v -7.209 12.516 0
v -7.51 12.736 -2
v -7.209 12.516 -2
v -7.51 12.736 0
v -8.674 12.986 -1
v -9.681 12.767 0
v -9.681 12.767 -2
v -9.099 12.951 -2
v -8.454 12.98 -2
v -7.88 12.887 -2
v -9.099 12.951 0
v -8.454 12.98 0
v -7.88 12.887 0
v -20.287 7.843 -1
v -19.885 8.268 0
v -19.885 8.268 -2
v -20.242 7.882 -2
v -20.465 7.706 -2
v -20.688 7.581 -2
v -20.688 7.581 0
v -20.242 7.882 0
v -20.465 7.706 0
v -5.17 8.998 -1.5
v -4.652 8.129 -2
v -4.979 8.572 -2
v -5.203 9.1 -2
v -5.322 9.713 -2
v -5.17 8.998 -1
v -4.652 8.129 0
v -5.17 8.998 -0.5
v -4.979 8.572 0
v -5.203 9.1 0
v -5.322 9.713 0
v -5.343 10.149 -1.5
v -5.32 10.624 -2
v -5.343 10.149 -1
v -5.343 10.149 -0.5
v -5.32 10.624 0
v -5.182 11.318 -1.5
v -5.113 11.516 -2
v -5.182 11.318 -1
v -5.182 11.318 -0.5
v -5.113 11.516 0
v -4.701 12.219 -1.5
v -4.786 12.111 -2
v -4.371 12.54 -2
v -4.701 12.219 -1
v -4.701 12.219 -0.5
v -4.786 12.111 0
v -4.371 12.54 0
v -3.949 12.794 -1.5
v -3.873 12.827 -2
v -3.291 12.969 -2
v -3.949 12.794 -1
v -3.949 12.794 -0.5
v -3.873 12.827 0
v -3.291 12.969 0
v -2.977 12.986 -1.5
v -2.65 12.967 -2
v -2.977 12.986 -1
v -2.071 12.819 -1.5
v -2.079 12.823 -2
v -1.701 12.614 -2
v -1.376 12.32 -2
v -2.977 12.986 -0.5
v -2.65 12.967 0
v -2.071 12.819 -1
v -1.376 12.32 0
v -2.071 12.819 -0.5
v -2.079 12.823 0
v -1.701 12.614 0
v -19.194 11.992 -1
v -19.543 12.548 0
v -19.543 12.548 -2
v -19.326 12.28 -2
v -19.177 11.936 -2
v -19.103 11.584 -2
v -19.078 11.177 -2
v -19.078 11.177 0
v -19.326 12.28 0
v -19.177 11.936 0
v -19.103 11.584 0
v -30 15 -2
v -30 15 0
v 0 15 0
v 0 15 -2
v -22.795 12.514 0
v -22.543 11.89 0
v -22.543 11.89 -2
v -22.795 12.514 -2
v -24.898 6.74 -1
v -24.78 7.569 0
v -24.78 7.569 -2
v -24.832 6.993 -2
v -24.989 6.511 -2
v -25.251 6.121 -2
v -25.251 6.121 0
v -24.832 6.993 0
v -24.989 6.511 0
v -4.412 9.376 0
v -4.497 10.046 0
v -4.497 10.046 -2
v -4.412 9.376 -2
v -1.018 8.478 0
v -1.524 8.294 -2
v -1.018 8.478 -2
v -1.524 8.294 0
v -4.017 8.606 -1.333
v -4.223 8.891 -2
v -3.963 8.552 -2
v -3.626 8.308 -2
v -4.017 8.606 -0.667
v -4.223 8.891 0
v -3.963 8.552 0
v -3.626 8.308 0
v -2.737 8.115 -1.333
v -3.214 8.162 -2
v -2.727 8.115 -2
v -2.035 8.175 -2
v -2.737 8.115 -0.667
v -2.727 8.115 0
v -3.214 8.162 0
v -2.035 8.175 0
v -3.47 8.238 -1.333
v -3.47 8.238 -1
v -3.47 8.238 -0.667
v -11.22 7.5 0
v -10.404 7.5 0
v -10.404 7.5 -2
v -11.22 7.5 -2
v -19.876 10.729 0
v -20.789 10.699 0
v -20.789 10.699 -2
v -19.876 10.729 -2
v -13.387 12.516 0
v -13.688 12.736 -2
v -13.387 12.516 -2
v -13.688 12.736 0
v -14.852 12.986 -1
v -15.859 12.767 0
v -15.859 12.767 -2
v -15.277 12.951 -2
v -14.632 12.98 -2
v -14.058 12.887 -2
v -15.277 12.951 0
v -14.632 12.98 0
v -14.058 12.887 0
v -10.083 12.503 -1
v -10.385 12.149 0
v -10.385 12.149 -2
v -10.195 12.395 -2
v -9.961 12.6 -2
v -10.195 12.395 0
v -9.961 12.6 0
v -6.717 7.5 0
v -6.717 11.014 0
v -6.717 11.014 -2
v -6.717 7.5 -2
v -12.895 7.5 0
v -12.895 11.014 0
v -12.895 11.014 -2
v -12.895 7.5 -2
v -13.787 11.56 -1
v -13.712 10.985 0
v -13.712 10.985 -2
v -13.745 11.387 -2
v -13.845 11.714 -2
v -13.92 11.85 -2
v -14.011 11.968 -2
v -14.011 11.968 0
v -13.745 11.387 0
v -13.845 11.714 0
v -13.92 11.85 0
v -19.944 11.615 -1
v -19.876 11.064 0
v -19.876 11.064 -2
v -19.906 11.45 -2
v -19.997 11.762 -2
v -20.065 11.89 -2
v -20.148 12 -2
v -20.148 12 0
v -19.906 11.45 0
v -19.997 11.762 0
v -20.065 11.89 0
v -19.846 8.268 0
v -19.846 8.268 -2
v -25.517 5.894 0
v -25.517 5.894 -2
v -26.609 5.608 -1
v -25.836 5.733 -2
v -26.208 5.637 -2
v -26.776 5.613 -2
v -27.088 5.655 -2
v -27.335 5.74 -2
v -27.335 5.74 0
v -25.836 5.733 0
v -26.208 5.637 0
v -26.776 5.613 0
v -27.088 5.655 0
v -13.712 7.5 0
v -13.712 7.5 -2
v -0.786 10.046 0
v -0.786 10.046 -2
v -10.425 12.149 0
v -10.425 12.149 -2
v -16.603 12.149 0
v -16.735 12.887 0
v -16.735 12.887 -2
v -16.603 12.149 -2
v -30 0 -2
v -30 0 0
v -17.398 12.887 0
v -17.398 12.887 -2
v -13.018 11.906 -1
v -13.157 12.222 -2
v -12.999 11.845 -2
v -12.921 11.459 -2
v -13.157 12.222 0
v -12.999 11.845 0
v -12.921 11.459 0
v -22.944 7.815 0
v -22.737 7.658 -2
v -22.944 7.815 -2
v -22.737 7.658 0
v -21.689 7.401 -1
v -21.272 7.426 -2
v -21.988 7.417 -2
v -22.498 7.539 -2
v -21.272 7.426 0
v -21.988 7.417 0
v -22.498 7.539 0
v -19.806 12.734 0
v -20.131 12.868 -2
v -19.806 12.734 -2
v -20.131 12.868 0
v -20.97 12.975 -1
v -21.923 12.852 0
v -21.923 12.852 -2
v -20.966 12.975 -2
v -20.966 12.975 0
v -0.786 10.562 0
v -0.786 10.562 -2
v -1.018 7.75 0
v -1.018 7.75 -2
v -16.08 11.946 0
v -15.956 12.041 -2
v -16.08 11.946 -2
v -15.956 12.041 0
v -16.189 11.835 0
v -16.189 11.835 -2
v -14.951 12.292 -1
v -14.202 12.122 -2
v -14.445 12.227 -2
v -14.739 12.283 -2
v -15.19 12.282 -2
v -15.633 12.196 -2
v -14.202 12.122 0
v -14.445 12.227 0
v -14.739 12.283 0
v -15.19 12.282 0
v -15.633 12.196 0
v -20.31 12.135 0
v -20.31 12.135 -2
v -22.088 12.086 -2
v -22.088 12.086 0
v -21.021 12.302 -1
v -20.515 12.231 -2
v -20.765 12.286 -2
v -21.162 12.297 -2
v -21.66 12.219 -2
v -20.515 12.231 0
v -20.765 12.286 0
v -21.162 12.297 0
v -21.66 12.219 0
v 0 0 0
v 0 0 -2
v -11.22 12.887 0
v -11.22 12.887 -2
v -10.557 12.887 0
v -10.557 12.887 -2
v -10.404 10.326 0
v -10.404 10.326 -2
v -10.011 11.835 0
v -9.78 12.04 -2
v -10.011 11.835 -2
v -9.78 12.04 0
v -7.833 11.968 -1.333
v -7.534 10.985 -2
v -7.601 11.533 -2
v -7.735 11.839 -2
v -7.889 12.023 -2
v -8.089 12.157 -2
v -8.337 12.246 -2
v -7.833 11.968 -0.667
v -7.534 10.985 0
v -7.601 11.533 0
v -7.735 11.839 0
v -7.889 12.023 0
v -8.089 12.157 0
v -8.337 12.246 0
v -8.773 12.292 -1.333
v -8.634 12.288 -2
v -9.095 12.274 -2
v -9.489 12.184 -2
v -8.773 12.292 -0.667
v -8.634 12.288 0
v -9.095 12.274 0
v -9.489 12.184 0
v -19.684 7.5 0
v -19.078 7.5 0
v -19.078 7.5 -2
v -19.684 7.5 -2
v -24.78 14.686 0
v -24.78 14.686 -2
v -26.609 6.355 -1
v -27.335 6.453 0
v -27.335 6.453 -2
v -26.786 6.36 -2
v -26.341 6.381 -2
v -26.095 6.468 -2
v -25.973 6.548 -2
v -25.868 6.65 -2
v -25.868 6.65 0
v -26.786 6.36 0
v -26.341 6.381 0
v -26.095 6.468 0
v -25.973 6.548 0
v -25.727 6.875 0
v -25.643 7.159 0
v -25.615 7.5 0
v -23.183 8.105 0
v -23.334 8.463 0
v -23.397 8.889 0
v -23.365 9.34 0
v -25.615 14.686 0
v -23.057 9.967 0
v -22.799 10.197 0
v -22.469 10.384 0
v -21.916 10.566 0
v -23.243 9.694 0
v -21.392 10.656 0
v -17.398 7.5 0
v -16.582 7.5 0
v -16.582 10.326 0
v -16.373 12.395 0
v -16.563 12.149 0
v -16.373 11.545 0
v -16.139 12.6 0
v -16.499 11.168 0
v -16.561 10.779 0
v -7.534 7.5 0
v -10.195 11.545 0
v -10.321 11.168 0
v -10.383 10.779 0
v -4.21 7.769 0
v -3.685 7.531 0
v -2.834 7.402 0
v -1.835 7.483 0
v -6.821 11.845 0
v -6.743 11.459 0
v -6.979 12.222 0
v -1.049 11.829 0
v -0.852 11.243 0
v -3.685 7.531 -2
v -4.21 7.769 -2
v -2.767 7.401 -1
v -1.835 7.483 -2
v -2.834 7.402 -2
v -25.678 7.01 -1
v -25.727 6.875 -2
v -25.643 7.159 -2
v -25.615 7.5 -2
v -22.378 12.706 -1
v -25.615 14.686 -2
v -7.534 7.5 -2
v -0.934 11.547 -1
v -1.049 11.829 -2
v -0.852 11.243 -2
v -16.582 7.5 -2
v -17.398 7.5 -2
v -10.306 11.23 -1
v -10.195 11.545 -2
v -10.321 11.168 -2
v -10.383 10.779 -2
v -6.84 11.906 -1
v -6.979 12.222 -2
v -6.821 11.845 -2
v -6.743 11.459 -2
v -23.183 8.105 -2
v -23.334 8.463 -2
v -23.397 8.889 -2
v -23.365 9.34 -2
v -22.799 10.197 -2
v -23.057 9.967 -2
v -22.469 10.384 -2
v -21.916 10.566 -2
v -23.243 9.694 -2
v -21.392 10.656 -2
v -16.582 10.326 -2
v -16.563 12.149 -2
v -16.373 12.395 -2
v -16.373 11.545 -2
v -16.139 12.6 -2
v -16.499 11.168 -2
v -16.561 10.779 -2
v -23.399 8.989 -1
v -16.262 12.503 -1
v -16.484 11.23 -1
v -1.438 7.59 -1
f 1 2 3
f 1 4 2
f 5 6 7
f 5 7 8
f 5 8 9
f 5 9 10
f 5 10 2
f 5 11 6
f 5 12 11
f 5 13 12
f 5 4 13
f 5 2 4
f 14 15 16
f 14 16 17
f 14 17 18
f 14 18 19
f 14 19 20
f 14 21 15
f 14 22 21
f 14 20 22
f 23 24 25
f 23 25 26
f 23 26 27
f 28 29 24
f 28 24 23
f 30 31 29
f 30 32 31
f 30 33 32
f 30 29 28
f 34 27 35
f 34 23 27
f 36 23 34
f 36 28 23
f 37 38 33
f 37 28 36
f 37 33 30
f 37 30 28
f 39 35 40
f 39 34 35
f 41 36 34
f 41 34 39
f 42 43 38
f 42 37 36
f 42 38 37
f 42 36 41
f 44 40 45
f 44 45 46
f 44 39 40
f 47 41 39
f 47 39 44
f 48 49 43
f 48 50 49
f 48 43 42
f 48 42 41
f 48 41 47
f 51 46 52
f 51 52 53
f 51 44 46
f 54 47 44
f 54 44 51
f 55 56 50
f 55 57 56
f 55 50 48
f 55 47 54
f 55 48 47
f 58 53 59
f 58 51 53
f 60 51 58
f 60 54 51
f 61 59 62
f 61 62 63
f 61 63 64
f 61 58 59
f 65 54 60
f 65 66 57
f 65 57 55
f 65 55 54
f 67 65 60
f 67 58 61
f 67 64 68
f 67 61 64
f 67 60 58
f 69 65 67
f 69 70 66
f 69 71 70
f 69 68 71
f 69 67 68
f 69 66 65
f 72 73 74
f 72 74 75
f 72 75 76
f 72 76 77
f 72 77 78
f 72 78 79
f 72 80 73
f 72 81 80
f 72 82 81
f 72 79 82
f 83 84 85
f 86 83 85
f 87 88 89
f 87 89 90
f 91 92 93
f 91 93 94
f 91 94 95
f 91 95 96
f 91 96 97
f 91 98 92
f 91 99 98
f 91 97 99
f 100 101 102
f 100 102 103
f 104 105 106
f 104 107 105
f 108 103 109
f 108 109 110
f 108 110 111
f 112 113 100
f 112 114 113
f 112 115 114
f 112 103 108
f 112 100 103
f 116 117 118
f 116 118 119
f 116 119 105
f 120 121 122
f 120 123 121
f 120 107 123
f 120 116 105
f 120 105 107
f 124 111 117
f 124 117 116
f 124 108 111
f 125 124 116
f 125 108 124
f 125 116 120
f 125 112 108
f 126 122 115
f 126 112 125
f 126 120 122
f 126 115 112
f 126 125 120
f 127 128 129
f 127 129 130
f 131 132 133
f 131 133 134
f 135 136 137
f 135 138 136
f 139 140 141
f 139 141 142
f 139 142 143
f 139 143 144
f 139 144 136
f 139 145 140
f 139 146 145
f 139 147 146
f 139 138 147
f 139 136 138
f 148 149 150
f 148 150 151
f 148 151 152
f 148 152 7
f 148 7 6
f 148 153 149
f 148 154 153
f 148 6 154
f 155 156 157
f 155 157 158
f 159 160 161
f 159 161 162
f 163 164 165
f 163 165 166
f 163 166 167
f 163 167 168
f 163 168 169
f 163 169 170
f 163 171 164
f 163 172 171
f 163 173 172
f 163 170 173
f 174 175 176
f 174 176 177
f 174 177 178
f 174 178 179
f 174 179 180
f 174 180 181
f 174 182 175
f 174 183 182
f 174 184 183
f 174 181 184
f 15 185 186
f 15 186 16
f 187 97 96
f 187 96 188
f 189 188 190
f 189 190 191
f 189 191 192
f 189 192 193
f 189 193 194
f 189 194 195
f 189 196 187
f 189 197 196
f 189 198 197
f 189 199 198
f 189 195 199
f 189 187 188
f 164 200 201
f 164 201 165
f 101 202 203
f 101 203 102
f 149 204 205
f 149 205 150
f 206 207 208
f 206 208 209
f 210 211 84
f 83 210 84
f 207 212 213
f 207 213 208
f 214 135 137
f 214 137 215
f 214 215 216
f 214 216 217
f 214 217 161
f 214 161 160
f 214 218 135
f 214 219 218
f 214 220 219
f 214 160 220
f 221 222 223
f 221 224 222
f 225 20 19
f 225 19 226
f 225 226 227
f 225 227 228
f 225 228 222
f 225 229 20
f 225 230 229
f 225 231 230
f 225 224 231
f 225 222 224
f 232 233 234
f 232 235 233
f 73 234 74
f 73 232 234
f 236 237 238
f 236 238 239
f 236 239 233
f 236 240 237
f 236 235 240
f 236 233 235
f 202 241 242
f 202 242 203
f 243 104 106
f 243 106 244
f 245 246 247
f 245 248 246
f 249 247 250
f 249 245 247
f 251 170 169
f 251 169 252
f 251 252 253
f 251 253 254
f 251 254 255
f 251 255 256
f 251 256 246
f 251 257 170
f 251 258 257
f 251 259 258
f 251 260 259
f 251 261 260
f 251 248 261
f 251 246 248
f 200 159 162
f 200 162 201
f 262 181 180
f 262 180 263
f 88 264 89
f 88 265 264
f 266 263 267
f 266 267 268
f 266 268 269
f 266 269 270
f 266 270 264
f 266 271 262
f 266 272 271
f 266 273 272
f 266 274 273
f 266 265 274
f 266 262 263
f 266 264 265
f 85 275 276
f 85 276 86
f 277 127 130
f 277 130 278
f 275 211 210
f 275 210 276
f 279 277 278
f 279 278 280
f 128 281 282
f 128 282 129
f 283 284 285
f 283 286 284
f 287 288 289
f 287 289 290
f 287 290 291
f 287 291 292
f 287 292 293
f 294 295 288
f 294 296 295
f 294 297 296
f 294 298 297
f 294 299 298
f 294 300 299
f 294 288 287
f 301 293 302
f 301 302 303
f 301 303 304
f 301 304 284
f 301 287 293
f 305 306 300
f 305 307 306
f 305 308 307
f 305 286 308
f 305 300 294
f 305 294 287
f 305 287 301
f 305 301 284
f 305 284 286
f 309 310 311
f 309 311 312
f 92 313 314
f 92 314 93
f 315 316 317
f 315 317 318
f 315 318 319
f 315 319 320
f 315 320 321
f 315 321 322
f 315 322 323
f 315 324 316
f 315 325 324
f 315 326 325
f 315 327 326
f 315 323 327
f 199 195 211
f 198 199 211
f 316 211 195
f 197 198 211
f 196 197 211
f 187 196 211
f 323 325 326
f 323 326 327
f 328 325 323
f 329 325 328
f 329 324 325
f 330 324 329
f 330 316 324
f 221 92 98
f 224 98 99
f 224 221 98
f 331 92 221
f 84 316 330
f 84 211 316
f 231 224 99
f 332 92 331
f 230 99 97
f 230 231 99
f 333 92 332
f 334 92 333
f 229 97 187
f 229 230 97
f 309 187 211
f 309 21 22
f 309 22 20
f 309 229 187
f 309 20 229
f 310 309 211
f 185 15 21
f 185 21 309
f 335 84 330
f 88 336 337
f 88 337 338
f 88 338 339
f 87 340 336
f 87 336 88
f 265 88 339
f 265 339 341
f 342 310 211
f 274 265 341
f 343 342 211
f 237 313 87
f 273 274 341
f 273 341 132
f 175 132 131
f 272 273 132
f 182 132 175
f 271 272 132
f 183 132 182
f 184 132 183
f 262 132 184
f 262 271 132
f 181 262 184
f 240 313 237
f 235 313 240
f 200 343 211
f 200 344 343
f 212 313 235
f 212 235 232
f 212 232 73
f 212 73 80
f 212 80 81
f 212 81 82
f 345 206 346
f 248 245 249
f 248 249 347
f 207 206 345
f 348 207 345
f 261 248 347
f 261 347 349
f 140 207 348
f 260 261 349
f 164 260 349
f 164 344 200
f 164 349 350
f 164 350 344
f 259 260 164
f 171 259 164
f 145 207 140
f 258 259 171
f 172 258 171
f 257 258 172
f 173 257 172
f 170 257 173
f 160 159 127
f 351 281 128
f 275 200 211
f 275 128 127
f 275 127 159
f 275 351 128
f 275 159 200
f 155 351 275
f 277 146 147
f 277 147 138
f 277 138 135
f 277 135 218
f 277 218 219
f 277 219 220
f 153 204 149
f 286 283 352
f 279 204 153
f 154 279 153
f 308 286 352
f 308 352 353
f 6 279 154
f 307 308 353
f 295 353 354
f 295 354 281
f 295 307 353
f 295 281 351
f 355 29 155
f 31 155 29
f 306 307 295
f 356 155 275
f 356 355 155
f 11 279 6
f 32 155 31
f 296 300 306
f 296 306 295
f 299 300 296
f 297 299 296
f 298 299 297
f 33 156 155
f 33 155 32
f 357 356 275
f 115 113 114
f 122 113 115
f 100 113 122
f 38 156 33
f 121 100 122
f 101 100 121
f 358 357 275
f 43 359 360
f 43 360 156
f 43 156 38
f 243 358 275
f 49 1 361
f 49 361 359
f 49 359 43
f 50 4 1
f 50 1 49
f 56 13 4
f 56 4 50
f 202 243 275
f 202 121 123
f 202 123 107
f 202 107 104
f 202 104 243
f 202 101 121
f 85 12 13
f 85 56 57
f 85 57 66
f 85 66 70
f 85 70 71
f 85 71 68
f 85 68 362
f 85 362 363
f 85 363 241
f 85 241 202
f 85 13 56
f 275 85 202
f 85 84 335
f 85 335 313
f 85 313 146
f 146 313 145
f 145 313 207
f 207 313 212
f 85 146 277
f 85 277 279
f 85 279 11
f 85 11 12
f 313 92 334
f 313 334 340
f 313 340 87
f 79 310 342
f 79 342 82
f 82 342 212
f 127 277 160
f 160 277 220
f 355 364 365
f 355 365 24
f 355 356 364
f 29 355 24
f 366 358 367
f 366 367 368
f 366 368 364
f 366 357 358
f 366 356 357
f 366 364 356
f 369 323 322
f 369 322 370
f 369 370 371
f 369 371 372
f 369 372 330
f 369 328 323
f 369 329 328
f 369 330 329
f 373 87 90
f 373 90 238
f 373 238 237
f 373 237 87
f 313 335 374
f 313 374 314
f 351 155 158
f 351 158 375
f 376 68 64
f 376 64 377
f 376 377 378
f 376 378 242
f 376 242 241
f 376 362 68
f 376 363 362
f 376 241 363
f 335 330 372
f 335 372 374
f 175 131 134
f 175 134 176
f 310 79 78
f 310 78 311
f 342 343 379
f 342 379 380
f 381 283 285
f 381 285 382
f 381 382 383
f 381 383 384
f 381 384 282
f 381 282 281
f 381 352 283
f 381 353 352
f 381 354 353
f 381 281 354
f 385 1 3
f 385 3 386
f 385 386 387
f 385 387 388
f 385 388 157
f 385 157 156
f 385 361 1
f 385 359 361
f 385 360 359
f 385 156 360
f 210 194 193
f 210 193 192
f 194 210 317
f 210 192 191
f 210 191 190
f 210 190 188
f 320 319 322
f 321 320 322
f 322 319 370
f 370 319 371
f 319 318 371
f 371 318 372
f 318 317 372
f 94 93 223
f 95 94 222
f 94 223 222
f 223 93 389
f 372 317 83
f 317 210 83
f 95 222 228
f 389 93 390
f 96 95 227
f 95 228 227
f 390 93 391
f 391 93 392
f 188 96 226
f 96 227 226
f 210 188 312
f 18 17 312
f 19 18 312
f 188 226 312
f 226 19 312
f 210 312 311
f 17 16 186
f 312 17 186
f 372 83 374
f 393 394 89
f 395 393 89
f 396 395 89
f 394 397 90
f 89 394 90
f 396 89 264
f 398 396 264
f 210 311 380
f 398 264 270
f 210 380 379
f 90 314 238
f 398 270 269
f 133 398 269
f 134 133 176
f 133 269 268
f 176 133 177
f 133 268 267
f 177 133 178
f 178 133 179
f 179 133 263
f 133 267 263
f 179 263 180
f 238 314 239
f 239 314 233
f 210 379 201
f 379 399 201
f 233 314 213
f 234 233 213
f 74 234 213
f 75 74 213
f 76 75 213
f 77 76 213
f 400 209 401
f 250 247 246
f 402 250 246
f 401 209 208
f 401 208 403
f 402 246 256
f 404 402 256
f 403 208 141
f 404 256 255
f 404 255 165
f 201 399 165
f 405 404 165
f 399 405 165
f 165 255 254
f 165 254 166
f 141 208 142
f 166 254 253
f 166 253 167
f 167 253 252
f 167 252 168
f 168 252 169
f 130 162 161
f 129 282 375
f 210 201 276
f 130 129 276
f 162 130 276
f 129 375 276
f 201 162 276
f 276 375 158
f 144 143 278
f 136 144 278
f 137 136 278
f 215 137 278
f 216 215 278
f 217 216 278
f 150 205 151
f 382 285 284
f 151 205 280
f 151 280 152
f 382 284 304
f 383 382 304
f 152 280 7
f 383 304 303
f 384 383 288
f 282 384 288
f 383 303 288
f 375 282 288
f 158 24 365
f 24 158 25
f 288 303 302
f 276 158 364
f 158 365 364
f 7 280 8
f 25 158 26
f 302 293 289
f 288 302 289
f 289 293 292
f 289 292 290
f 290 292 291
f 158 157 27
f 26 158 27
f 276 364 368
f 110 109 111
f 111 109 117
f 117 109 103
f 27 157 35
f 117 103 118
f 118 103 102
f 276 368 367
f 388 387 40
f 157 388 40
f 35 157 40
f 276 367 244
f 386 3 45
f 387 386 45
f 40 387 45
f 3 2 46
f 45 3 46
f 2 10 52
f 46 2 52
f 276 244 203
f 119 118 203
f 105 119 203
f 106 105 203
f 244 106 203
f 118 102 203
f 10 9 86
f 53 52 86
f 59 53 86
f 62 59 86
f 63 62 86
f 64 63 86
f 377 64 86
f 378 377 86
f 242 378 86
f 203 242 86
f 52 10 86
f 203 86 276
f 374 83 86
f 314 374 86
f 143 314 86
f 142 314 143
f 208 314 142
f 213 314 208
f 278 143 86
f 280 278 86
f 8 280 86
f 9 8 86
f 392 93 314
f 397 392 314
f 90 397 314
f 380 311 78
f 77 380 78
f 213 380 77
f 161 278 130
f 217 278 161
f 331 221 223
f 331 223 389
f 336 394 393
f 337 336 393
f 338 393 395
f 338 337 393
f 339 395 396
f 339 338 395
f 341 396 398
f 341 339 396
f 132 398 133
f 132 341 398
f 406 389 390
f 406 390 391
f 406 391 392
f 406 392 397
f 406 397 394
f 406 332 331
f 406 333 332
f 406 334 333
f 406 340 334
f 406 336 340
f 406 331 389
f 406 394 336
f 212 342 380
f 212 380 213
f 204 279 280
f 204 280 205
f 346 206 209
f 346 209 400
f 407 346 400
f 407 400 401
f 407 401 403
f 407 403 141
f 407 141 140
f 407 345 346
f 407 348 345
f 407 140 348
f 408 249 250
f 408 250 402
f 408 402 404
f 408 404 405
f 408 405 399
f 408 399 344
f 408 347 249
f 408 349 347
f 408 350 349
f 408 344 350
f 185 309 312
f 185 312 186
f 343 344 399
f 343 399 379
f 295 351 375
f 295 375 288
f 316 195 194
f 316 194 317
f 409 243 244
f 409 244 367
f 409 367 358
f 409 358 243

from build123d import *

# Parameters (mm, degrees)
F0_W     = 30
F0_H     = 15
F1_DEPTH = 2


with BuildPart() as f1:
    # F0 (on Top) → F1 (new body)
    with BuildSketch(Plane.XY):
        with Locations((-15, 7.5)):
            Rectangle(F0_W, F0_H)
        with BuildLine():
            add(Edge.make_bspline(
                [(-25.2514986596, 6.1214301728), (-25.723342297, 5.6079070142), (-26.6088355231, 5.6079070142)],
                knots=[0, 0, 0, 1, 1, 1], degree=2))
            add(Edge.make_bspline(
                [(-26.6088355231, 5.6079070142), (-27.0696694756, 5.6079070142), (-27.3354747247, 5.7400232326)],
                knots=[0, 0, 0, 1, 1, 1], degree=2))
            Line((-27.3354747247, 5.7400232326), (-27.3354747247, 6.4525071251))
            add(Edge.make_bspline(
                [(-27.3354747247, 6.4525071251), (-26.986310433, 6.3549927733), (-26.6088355231, 6.3549927733)],
                knots=[0, 0, 0, 1, 1, 1], degree=2))
            add(Edge.make_bspline(
                [(-26.6088355231, 6.3549927733), (-26.1212637645, 6.3549927733), (-25.8680410125, 6.6498950467)],
                knots=[0, 0, 0, 1, 1, 1], degree=2))
            add(Edge.make_bspline(
                [(-25.8680410125, 6.6498950467), (-25.6148182604, 6.94479732), (-25.6148182604, 7.5)],
                knots=[0, 0, 0, 1, 1, 1], degree=2))
            Line((-25.6148182604, 7.5), (-25.6148182604, 14.6861785971))
            Line((-25.6148182604, 14.6861785971), (-24.7796550223, 14.6861785971))
            Line((-24.7796550223, 14.6861785971), (-24.7796550223, 7.5692037335))
            add(Edge.make_bspline(
                [(-24.7796550223, 7.5692037335), (-24.7796550223, 6.6349533315), (-25.2514986596, 6.1214301728)],
                knots=[0, 0, 0, 1, 1, 1], degree=2))
        make_face(mode=Mode.SUBTRACT)
        with BuildLine():
            Line((-19.0782110708, 7.5), (-19.6837437387, 7.5))
            Line((-19.6837437387, 7.5), (-19.8457433876, 8.2675323168))
            Line((-19.8457433876, 8.2675323168), (-19.8850636907, 8.2675323168))
            add(Edge.make_bspline(
                [(-19.8850636907, 8.2675323168), (-20.2877035946, 7.7610868127), (-20.6879842802, 7.5809998244)],
                knots=[0, 0, 0, 1, 1, 1], degree=2))
            add(Edge.make_bspline(
                [(-20.6879842802, 7.5809998244), (-21.0882649659, 7.4009128362), (-21.6890791975, 7.4009128362)],
                knots=[0, 0, 0, 1, 1, 1], degree=2))
            add(Edge.make_bspline(
                [(-21.6890791975, 7.4009128362), (-22.4896405689, 7.4009128362), (-22.9441832729, 7.8145624249)],
                knots=[0, 0, 0, 1, 1, 1], degree=2))
            add(Edge.make_bspline(
                [(-22.9441832729, 7.8145624249), (-23.3987259769, 8.2282120137), (-23.3987259769, 8.9894530819)],
                knots=[0, 0, 0, 1, 1, 1], degree=2))
            add(Edge.make_bspline(
                [(-23.3987259769, 8.9894530819), (-23.3987259769, 10.6204592551), (-20.7894306623, 10.6990998613)],
                knots=[0, 0, 0, 1, 1, 1], degree=2))
            Line((-20.7894306623, 10.6990998613), (-19.8756268179, 10.7289832917))
            Line((-19.8756268179, 10.7289832917), (-19.8756268179, 11.0639922742))
            add(Edge.make_bspline(
                [(-19.8756268179, 11.0639922742), (-19.8756268179, 11.6978355604), (-20.1477233155, 11.9998154883)],
                knots=[0, 0, 0, 1, 1, 1], degree=2))
            add(Edge.make_bspline(
                [(-20.1477233155, 11.9998154883), (-20.419819813, 12.3017954162), (-21.0206340446, 12.3017954162)],
                knots=[0, 0, 0, 1, 1, 1], degree=2))
            add(Edge.make_bspline(
                [(-21.0206340446, 12.3017954162), (-21.6937976339, 12.3017954162), (-22.5431161812, 11.8897186396)],
                knots=[0, 0, 0, 1, 1, 1], degree=2))
            Line((-22.5431161812, 11.8897186396), (-22.7947661211, 12.5141250531))
            add(Edge.make_bspline(
                [(-22.7947661211, 12.5141250531), (-22.3968446536, 12.7296003141), (-21.922641798, 12.8522796598)],
                knots=[0, 0, 0, 1, 1, 1], degree=2))
            add(Edge.make_bspline(
                [(-21.922641798, 12.8522796598), (-21.4484389425, 12.9749590056), (-20.9703040566, 12.9749590056)],
                knots=[0, 0, 0, 1, 1, 1], degree=2))
            add(Edge.make_bspline(
                [(-20.9703040566, 12.9749590056), (-20.0077430364, 12.9749590056), (-19.5429770536, 12.5479405137)],
                knots=[0, 0, 0, 1, 1, 1], degree=2))
            add(Edge.make_bspline(
                [(-19.5429770536, 12.5479405137), (-19.0782110708, 12.1209220219), (-19.0782110708, 11.1772347472)],
                knots=[0, 0, 0, 1, 1, 1], degree=2))
            Line((-19.0782110708, 11.1772347472), (-19.0782110708, 7.5))
        make_face(mode=Mode.SUBTRACT)
        with BuildLine():
            Line((-12.8954866092, 7.5), (-13.7117761018, 7.5))
            Line((-13.7117761018, 7.5), (-13.7117761018, 10.985351668))
            add(Edge.make_bspline(
                [(-13.7117761018, 10.985351668), (-13.7117761018, 11.6427871361), (-14.0113968115, 11.9675728398)],
                knots=[0, 0, 0, 1, 1, 1], degree=2))
            add(Edge.make_bspline(
                [(-14.0113968115, 11.9675728398), (-14.3110175213, 12.2923585435), (-14.951152056, 12.2923585435)],
                knots=[0, 0, 0, 1, 1, 1], degree=2))
            add(Edge.make_bspline(
                [(-14.951152056, 12.2923585435), (-15.7957521668, 12.2923585435), (-16.188955198, 11.8354566213)],
                knots=[0, 0, 0, 1, 1, 1], degree=2))
            add(Edge.make_bspline(
                [(-16.188955198, 11.8354566213), (-16.5821582291, 11.3785546991), (-16.5821582291, 10.3263433878)],
                knots=[0, 0, 0, 1, 1, 1], degree=2))
            Line((-16.5821582291, 10.3263433878), (-16.5821582291, 7.5))
            Line((-16.5821582291, 7.5), (-17.3984477218, 7.5))
            Line((-17.3984477218, 7.5), (-17.3984477218, 12.8868815266))
            Line((-17.3984477218, 12.8868815266), (-16.7347210052, 12.8868815266))
            Line((-16.7347210052, 12.8868815266), (-16.6026047867, 12.1492326402))
            Line((-16.6026047867, 12.1492326402), (-16.5632844836, 12.1492326402))
            add(Edge.make_bspline(
                [(-16.5632844836, 12.1492326402), (-16.3116345437, 12.5471541077), (-15.8594510579, 12.7665613991)],
                knots=[0, 0, 0, 1, 1, 1], degree=2))
            add(Edge.make_bspline(
                [(-15.8594510579, 12.7665613991), (-15.4072675721, 12.9859686904), (-14.8520648921, 12.9859686904)],
                knots=[0, 0, 0, 1, 1, 1], degree=2))
            add(Edge.make_bspline(
                [(-14.8520648921, 12.9859686904), (-13.878494187, 12.9859686904), (-13.3869903981, 12.5164842712)],
                knots=[0, 0, 0, 1, 1, 1], degree=2))
            add(Edge.make_bspline(
                [(-13.3869903981, 12.5164842712), (-12.8954866092, 12.0469998521), (-12.8954866092, 11.0136622862)],
                knots=[0, 0, 0, 1, 1, 1], degree=2))
            Line((-12.8954866092, 11.0136622862), (-12.8954866092, 7.5))
        make_face(mode=Mode.SUBTRACT)
        with BuildLine():
            Line((-6.7174805839, 7.5), (-7.5337700766, 7.5))
            Line((-7.5337700766, 7.5), (-7.5337700766, 10.985351668))
            add(Edge.make_bspline(
                [(-7.5337700766, 10.985351668), (-7.5337700766, 11.6427871361), (-7.8333907863, 11.9675728398)],
                knots=[0, 0, 0, 1, 1, 1], degree=2))
            add(Edge.make_bspline(
                [(-7.8333907863, 11.9675728398), (-8.133011496, 12.2923585435), (-8.7731460307, 12.2923585435)],
                knots=[0, 0, 0, 1, 1, 1], degree=2))
            add(Edge.make_bspline(
                [(-8.7731460307, 12.2923585435), (-9.6177461416, 12.2923585435), (-10.0109491728, 11.8354566213)],
                knots=[0, 0, 0, 1, 1, 1], degree=2))
            add(Edge.make_bspline(
                [(-10.0109491728, 11.8354566213), (-10.4041522039, 11.3785546991), (-10.4041522039, 10.3263433878)],
                knots=[0, 0, 0, 1, 1, 1], degree=2))
            Line((-10.4041522039, 10.3263433878), (-10.4041522039, 7.5))
            Line((-10.4041522039, 7.5), (-11.2204416965, 7.5))
            Line((-11.2204416965, 7.5), (-11.2204416965, 12.8868815266))
            Line((-11.2204416965, 12.8868815266), (-10.55671498, 12.8868815266))
            Line((-10.55671498, 12.8868815266), (-10.4245987615, 12.1492326402))
            Line((-10.4245987615, 12.1492326402), (-10.3852784584, 12.1492326402))
            add(Edge.make_bspline(
                [(-10.3852784584, 12.1492326402), (-10.1336285185, 12.5471541077), (-9.6814450327, 12.7665613991)],
                knots=[0, 0, 0, 1, 1, 1], degree=2))
            add(Edge.make_bspline(
                [(-9.6814450327, 12.7665613991), (-9.2292615469, 12.9859686904), (-8.6740588669, 12.9859686904)],
                knots=[0, 0, 0, 1, 1, 1], degree=2))
            add(Edge.make_bspline(
                [(-8.6740588669, 12.9859686904), (-7.7004881618, 12.9859686904), (-7.2089843729, 12.5164842712)],
                knots=[0, 0, 0, 1, 1, 1], degree=2))
            add(Edge.make_bspline(
                [(-7.2089843729, 12.5164842712), (-6.7174805839, 12.0469998521), (-6.7174805839, 11.0136622862)],
                knots=[0, 0, 0, 1, 1, 1], degree=2))
            Line((-6.7174805839, 11.0136622862), (-6.7174805839, 7.5))
        make_face(mode=Mode.SUBTRACT)
        with BuildLine():
            add(Edge.make_bspline(
                [(-1.8354717493, 7.4826990666), (-2.2208107199, 7.4009128362), (-2.7665765271, 7.4009128362)],
                knots=[0, 0, 0, 1, 1, 1], degree=2))
            add(Edge.make_bspline(
                [(-2.7665765271, 7.4009128362), (-3.9603409296, 7.4009128362), (-4.6515918584, 8.1291248498)],
                knots=[0, 0, 0, 1, 1, 1], degree=2))
            add(Edge.make_bspline(
                [(-4.6515918584, 8.1291248498), (-5.3428427871, 8.8573368635), (-5.3428427871, 10.1486156177)],
                knots=[0, 0, 0, 1, 1, 1], degree=2))
            add(Edge.make_bspline(
                [(-5.3428427871, 10.1486156177), (-5.3428427871, 11.452476869), (-4.7011354403, 12.2192227797)],
                knots=[0, 0, 0, 1, 1, 1], degree=2))
            add(Edge.make_bspline(
                [(-4.7011354403, 12.2192227797), (-4.0594280935, 12.9859686904), (-2.9773333518, 12.9859686904)],
                knots=[0, 0, 0, 1, 1, 1], degree=2))
            add(Edge.make_bspline(
                [(-2.9773333518, 12.9859686904), (-1.9660151557, 12.9859686904), (-1.376210609, 12.3198827557)],
                knots=[0, 0, 0, 1, 1, 1], degree=2))
            add(Edge.make_bspline(
                [(-1.376210609, 12.3198827557), (-0.7864060623, 11.6537968209), (-0.7864060623, 10.5622652065)],
                knots=[0, 0, 0, 1, 1, 1], degree=2))
            Line((-0.7864060623, 10.5622652065), (-0.7864060623, 10.0463828296))
            Line((-0.7864060623, 10.0463828296), (-4.4966698641, 10.0463828296))
            add(Edge.make_bspline(
                [(-4.4966698641, 10.0463828296), (-4.4715048701, 9.0979771185), (-4.0169621661, 8.6064733296)],
                knots=[0, 0, 0, 1, 1, 1], degree=2))
            add(Edge.make_bspline(
                [(-4.0169621661, 8.6064733296), (-3.5624194621, 8.1149695407), (-2.7366930967, 8.1149695407)],
                knots=[0, 0, 0, 1, 1, 1], degree=2))
            add(Edge.make_bspline(
                [(-2.7366930967, 8.1149695407), (-1.8669279918, 8.1149695407), (-1.0176094446, 8.4782891415)],
                knots=[0, 0, 0, 1, 1, 1], degree=2))
            Line((-1.0176094446, 8.4782891415), (-1.0176094446, 7.7500771278))
            add(Edge.make_bspline(
                [(-1.0176094446, 7.7500771278), (-1.4501327788, 7.5644852971), (-1.8354717493, 7.4826990666)],
                knots=[0, 0, 0, 1, 1, 1], degree=2))
        make_face(mode=Mode.SUBTRACT)
    extrude(amount=-F1_DEPTH)


solid = f1.part
